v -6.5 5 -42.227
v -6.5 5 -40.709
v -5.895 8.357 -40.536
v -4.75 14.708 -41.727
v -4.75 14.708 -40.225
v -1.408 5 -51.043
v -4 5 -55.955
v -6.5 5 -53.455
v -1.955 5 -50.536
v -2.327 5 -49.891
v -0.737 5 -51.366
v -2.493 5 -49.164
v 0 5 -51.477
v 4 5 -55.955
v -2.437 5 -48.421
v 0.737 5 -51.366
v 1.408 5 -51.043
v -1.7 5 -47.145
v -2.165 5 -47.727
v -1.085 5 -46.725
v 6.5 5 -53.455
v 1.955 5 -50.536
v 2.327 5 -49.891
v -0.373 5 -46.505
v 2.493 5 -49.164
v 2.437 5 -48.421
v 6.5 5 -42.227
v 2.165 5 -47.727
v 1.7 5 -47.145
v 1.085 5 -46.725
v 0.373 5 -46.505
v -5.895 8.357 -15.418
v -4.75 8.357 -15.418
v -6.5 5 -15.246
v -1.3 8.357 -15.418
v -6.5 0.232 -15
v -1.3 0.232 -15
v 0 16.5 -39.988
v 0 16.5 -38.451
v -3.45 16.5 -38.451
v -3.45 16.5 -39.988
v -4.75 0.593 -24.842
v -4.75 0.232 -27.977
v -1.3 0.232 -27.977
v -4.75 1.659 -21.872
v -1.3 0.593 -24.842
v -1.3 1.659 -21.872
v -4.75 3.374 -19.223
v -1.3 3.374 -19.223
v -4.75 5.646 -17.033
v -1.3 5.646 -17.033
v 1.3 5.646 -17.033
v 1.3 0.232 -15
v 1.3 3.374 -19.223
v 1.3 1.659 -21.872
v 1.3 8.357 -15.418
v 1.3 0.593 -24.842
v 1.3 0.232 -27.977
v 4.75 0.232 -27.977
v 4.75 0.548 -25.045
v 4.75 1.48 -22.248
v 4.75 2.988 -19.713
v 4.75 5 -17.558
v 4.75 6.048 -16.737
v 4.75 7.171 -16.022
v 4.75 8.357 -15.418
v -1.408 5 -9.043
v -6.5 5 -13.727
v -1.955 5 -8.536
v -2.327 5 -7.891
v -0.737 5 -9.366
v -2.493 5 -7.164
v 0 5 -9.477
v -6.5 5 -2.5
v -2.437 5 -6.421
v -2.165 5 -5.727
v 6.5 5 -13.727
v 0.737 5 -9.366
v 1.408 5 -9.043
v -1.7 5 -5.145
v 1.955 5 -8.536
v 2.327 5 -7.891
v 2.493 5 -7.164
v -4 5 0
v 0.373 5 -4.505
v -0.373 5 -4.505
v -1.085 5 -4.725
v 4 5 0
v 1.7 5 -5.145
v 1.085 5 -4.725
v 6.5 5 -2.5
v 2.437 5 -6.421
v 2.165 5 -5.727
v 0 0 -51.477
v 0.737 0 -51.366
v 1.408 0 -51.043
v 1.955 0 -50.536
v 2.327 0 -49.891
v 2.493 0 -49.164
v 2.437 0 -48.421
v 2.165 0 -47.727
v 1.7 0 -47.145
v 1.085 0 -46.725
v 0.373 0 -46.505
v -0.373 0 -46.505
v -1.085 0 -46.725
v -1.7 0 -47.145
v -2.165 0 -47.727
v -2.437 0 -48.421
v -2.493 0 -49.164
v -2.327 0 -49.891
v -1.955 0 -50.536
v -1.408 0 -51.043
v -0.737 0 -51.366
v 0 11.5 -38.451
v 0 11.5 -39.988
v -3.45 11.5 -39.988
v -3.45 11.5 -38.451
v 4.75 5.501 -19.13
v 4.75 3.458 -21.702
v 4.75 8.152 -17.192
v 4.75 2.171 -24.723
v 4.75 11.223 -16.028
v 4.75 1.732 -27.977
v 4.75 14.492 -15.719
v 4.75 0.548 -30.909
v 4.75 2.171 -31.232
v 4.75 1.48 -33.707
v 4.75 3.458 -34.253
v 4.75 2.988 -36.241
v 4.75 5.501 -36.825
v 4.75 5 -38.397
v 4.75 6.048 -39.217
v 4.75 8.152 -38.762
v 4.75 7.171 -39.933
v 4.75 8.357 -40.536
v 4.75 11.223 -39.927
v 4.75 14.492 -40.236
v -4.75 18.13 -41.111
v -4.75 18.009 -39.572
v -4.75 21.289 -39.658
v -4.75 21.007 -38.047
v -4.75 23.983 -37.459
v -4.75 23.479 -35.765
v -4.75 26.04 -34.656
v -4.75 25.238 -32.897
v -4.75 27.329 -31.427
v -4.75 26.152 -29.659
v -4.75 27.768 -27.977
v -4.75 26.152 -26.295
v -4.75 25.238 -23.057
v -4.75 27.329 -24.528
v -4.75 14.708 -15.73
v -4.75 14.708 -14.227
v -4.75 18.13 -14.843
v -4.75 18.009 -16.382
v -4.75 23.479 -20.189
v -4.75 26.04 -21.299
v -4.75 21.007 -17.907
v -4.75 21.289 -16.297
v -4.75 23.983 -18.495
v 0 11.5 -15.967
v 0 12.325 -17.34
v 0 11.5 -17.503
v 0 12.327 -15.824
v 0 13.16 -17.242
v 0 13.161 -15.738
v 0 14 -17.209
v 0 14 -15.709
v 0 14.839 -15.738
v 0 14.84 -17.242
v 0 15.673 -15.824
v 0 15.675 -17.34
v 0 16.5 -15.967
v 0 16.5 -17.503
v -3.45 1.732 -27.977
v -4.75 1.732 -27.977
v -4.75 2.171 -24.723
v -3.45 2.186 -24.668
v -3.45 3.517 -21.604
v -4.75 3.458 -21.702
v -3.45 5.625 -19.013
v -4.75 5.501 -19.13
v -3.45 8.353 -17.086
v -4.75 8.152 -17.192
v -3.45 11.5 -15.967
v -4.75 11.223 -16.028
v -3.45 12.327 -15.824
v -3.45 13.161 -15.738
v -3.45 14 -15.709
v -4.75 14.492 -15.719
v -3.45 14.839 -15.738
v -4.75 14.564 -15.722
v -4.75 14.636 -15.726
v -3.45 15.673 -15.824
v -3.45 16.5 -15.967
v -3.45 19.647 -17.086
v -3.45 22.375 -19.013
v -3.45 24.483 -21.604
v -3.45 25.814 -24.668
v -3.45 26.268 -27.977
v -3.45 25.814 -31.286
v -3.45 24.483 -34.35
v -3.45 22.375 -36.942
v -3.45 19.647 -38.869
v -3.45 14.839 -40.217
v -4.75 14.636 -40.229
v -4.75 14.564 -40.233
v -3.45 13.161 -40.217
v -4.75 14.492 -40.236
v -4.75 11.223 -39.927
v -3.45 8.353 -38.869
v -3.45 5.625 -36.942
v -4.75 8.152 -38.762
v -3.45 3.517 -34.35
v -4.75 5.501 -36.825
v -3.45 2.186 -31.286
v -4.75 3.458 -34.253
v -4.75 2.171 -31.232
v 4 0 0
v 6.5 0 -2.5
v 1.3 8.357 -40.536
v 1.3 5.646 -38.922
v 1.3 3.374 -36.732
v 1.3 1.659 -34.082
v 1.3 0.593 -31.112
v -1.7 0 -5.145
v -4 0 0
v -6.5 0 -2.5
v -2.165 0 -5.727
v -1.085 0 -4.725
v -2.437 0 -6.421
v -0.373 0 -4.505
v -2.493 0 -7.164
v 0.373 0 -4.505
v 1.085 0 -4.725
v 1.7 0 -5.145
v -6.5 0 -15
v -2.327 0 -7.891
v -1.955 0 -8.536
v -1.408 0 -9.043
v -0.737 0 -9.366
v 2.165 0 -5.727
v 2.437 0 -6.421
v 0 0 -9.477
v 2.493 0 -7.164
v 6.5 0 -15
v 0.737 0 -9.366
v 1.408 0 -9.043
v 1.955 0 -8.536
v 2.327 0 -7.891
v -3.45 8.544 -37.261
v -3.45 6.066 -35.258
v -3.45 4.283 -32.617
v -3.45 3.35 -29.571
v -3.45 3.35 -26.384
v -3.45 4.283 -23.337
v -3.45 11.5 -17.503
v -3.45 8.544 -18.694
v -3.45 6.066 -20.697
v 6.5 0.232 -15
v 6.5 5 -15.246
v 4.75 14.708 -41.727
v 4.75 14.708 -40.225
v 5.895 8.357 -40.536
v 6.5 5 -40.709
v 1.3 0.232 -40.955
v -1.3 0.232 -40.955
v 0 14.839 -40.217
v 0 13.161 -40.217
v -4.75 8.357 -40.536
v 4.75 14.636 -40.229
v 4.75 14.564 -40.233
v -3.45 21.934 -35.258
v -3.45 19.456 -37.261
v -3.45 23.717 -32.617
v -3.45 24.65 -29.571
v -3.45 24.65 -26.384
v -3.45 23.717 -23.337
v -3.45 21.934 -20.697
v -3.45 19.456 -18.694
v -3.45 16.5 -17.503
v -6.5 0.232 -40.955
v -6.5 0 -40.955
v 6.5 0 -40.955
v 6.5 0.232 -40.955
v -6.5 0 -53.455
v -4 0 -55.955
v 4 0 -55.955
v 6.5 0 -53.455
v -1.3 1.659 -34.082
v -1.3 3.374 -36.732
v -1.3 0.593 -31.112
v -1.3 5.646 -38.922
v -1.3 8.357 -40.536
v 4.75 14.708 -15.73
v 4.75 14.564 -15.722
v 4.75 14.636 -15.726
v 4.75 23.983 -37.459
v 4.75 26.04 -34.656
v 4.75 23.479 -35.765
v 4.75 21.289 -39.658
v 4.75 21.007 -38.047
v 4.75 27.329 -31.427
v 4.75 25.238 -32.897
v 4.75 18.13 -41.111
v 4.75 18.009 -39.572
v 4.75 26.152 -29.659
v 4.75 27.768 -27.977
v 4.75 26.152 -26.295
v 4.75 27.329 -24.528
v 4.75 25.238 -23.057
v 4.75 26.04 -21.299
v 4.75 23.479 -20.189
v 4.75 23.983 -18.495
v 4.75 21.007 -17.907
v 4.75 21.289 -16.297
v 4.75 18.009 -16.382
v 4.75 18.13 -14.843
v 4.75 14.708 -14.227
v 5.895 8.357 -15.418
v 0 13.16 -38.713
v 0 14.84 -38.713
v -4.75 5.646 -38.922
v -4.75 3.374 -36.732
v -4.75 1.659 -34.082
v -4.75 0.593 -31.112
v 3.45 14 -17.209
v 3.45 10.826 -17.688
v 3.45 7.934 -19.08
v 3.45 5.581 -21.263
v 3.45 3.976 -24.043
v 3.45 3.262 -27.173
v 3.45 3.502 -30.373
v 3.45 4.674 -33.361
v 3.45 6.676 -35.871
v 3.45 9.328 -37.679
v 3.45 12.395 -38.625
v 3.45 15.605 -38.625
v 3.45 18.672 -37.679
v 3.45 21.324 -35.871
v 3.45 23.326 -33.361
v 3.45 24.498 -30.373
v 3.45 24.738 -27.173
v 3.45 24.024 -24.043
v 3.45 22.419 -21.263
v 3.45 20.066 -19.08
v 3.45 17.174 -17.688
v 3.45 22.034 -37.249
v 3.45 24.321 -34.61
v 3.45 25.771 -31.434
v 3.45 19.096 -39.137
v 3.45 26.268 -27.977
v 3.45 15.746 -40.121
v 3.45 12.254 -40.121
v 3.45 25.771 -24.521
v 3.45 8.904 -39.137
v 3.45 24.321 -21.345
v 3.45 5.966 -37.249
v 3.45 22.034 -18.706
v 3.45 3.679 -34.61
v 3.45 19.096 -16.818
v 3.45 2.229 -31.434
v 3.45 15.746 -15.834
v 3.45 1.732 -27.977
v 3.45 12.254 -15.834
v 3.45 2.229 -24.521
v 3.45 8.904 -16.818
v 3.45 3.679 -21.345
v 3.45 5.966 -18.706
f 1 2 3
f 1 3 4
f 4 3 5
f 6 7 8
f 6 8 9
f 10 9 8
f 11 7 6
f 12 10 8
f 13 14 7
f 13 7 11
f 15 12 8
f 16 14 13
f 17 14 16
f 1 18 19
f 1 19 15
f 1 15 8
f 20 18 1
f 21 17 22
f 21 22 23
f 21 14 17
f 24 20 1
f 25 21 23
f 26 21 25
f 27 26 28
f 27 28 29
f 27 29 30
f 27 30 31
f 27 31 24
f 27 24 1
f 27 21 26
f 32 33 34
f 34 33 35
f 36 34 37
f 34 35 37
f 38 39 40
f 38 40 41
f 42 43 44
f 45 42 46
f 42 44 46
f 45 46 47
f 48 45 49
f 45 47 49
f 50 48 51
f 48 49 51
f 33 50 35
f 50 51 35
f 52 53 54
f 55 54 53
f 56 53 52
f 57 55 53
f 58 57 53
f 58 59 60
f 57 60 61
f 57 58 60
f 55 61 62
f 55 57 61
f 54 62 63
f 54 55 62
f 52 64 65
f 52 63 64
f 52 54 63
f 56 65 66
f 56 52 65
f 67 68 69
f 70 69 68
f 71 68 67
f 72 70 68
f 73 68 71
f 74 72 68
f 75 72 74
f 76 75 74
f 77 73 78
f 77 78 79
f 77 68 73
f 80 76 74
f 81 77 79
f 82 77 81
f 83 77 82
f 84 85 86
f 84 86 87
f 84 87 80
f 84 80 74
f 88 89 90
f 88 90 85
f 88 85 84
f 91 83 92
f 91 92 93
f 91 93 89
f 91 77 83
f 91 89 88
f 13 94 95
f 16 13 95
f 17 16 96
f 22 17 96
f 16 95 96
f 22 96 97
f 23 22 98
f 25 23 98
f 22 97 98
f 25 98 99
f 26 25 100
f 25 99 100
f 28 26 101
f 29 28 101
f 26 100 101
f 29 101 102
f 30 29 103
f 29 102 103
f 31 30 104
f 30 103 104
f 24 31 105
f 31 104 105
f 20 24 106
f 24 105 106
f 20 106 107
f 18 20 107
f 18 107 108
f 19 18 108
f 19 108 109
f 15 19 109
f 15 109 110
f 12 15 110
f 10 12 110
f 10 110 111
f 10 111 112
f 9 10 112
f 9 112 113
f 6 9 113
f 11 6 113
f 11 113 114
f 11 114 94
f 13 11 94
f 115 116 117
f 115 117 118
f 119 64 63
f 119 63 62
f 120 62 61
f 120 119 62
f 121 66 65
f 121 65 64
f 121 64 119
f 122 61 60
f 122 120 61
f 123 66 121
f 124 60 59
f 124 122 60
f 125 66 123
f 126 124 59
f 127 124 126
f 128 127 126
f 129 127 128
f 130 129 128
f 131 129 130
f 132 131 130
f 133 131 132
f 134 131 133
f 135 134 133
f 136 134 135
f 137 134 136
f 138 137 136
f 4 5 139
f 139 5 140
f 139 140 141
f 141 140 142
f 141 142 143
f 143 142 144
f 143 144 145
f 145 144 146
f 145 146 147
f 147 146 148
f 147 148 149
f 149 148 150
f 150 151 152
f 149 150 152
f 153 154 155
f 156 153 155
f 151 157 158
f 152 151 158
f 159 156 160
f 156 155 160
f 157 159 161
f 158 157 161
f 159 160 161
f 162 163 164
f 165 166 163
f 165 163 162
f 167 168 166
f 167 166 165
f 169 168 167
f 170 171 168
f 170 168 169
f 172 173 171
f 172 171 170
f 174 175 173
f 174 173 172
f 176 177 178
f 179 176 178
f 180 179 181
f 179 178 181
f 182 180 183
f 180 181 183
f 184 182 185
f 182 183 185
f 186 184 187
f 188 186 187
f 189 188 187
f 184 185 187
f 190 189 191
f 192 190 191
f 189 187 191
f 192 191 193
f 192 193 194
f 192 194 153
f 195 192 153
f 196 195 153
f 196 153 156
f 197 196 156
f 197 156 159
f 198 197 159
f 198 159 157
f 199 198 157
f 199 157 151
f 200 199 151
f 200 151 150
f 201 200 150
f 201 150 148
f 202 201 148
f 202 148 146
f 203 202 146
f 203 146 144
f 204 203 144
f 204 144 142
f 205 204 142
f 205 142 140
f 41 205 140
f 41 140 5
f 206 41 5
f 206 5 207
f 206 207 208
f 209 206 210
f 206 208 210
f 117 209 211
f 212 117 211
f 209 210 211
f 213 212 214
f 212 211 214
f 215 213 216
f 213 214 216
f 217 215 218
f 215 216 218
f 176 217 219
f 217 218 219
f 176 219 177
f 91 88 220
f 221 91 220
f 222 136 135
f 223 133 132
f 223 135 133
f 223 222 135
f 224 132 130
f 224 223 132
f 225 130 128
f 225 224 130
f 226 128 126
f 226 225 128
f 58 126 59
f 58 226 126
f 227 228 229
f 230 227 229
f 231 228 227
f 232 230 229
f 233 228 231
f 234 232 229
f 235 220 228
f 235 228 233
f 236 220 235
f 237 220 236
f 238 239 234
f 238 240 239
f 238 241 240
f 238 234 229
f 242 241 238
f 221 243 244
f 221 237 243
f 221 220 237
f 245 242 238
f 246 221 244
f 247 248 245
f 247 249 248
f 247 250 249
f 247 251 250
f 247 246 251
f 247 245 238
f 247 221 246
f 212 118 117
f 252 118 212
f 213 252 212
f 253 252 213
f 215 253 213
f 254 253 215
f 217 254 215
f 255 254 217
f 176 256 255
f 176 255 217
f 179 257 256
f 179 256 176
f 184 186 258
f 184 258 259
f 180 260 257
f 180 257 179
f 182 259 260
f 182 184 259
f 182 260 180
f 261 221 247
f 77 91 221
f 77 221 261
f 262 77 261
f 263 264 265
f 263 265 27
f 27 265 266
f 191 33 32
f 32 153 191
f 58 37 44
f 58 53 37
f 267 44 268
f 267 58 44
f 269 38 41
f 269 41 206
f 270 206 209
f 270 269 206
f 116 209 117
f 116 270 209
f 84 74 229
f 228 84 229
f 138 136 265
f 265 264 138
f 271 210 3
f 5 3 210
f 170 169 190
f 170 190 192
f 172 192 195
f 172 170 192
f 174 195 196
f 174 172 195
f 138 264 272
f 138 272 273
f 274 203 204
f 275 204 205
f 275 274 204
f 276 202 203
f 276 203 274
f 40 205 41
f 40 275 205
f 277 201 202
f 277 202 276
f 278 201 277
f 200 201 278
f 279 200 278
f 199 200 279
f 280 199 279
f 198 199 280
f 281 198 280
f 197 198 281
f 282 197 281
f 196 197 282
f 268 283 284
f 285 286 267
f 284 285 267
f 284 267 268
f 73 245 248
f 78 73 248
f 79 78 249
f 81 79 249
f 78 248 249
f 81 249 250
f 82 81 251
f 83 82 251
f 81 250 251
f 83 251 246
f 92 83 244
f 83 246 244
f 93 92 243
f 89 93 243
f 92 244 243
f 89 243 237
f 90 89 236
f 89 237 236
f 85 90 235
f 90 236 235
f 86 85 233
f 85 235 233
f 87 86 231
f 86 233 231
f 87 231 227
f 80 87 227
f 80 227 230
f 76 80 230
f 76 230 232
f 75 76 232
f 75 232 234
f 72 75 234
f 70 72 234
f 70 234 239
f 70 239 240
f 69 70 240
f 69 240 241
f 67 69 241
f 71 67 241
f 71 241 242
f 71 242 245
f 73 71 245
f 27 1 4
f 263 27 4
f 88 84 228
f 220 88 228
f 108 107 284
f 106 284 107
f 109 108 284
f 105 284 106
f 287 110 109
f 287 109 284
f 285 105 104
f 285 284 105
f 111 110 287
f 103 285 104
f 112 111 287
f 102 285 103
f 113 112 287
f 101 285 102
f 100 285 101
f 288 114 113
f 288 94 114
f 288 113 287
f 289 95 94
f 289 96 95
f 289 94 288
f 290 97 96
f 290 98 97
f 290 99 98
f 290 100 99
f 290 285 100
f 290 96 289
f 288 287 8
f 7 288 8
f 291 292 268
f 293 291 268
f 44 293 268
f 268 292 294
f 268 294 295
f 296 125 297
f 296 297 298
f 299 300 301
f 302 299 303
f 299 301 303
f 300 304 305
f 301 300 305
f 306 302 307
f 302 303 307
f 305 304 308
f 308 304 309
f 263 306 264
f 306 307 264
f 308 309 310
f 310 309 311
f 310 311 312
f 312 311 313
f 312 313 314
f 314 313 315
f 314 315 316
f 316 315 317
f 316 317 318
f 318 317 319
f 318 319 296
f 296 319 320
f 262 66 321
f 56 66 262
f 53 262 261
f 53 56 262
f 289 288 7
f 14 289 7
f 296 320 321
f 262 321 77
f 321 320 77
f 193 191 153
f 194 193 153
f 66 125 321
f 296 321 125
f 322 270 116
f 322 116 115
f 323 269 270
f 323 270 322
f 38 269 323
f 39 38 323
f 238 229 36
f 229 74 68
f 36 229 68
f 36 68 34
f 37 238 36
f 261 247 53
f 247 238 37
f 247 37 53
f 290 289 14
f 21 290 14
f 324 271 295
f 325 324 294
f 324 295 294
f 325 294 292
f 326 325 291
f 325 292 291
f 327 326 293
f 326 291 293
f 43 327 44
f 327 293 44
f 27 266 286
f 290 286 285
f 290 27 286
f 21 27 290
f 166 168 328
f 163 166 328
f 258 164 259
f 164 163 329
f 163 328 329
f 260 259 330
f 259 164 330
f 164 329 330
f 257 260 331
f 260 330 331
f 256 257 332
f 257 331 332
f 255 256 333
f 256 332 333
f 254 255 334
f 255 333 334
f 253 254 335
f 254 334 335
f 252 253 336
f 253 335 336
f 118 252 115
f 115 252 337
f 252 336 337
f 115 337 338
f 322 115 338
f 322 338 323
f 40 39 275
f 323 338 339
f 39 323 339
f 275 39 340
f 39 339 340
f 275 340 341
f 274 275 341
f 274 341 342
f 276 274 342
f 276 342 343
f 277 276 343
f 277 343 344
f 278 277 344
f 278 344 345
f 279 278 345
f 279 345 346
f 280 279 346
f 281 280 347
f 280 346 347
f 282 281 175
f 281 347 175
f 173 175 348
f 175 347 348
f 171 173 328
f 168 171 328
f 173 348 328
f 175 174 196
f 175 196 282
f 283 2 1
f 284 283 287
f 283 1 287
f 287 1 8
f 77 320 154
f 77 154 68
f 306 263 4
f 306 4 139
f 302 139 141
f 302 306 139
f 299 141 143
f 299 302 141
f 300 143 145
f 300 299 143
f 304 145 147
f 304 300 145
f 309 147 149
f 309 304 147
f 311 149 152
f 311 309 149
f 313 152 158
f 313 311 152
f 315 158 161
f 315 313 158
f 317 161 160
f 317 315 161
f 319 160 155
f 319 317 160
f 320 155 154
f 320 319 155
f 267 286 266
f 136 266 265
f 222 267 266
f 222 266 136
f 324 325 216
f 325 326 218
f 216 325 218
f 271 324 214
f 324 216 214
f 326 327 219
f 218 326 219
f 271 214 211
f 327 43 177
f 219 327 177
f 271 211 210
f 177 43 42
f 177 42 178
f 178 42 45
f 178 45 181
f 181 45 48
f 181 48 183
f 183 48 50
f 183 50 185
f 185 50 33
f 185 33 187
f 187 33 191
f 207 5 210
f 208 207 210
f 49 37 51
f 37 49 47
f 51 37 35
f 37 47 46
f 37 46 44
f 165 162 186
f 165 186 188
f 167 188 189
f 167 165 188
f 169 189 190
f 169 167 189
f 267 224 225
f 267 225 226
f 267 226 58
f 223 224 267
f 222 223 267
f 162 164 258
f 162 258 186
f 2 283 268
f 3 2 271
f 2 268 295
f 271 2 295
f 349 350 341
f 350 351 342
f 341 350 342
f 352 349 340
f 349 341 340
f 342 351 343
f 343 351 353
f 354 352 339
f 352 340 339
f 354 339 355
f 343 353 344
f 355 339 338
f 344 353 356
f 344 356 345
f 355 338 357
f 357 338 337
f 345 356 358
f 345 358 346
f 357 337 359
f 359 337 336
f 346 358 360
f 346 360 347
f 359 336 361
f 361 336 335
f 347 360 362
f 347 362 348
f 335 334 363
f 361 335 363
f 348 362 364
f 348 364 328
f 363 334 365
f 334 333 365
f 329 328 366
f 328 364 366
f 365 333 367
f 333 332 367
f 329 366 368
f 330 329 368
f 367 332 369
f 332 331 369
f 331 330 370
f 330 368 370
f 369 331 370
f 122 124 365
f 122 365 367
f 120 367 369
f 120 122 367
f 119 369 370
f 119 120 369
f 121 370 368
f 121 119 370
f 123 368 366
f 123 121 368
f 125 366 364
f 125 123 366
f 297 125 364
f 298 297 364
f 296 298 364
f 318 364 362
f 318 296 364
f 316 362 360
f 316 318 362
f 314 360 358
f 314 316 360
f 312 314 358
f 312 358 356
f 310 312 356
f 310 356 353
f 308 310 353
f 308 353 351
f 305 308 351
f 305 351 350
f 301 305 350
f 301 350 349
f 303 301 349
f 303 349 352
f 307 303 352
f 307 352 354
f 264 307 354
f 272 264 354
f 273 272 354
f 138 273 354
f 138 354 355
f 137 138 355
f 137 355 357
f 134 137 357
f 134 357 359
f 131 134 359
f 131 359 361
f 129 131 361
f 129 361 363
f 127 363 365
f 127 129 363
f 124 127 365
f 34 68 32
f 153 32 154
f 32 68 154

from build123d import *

# Parameters (mm, degrees)
SKETCH1_R              = 13.768224287
SKETCH1_R_2            = 12.268224287
SKETCH1_R_3            = 10.768224287
BOSS_EXTRUDE1_DEPTH    = 6.5
CUT_EXTRUDE3_DEPTH     = 519.353793234
CUT_EXTRUDE1_START     = -1.3
CUT_EXTRUDE1_DEPTH     = 13
CUT_EXTRUDE8_START     = -1.75
CUT_EXTRUDE8_OUTLINE_R = 10.768224287
CUT_EXTRUDE8_DEPTH     = 1.75
SKETCH6_R              = 12.268224287
CUT_EXTRUDE9_DEPTH     = 1.3
CUT_EXTRUDE12_START    = -1.75
CUT_EXTRUDE12_DEPTH    = 1.75
SKETCH8_R              = 2.5
CUT_EXTRUDE13_DEPTH    = 63.803249571
CHAMFER1_SIZE          = 2.5
CUT_EXTRUDE14_START    = -3.45
CUT_EXTRUDE14_DEPTH    = 3.45


# Read off the part's stored shape, not the designer's step: Cut-Extrude8
with BuildPart() as part:
    # Sketch1 → Boss-Extrude1 (new, symmetric)
    # profile 1 of 6: a face of its own
    with BuildSketch(Plane(origin=(0, 0, 0), x_dir=(0, 0, -1), z_dir=(1, 0, 0))):
        with BuildLine():
            Line((0, 5), (0, 0))
            Line((0, 0), (15, 0))
            Line((15, 0), (15, 0.231775713))
            Line((15, 0.231775713), (15.418491318, 8.357342638))
            ThreePointArc((15.418491318, 8.357342638), (14.445072398, 11.461887277), (14.227329557, 14.708166664))
            Line((14.227329557, 14.708166664), (13.727329557, 5))
            Line((13.727329557, 5), (0, 5))
        make_face()
    # profile 2 of 6: a face of its own
    with BuildSketch(Plane(origin=(0, 0, 0), x_dir=(0, 0, -1), z_dir=(1, 0, 0))):
        with BuildLine():
            Line((15.418491318, 8.357342638), (15, 0.231775713))
            Line((15, 0.231775713), (27.977329557, 0.231775713))
            ThreePointArc((27.977329557, 0.231775713), (20.498204345, 2.440299049), (15.418491318, 8.357342638))
        make_face()
    # profile 3 of 6: a face of its own
    with BuildSketch(Plane(origin=(0, 0, 0), x_dir=(0, 0, -1), z_dir=(1, 0, 0))):
        with BuildLine():
            ThreePointArc((40.536167797, 8.357342638), (35.45645477, 2.440299049), (27.977329557, 0.231775713))
            Line((27.977329557, 0.231775713), (40.954659115, 0.231775713))
            Line((40.954659115, 0.231775713), (40.536167797, 8.357342638))
        make_face()
    # profile 4 of 6: a face of its own
    with BuildSketch(Plane(origin=(0, 0, 0), x_dir=(0, 0, -1), z_dir=(1, 0, 0))):
        with BuildLine():
            Line((42.227329557, 5), (41.727329557, 14.708166664))
            ThreePointArc((41.727329557, 14.708166664), (41.740997019, 14.354200561), (41.745553845, 14))
            ThreePointArc((41.745553845, 14), (41.439812643, 11.114597224), (40.536167797, 8.357342638))
            Line((40.536167797, 8.357342638), (40.954659115, 0.231775713))
            Line((40.954659115, 0.231775713), (40.954659115, 0))
            Line((40.954659115, 0), (55.954659115, 0))
            Line((55.954659115, 0), (55.954659115, 5))
            Line((55.954659115, 5), (42.227329557, 5))
        make_face()
    # profile 5 of 6: a face of its own
    with BuildSketch(Plane(origin=(0, 0, 0), x_dir=(0, 0, -1), z_dir=(1, 0, 0))):
        with Locations((27.977329557, 14)):
            Circle(SKETCH1_R)
        with Locations((27.977329557, 14)):
            Circle(SKETCH1_R_2, mode=Mode.SUBTRACT)
    # profile 6 of 6: a face of its own
    with BuildSketch(Plane(origin=(0, 0, 0), x_dir=(0, 0, -1), z_dir=(1, 0, 0))):
        with Locations((27.977329557, 14)):
            Circle(SKETCH1_R_2)
        with Locations(Location((27.977329557, 14, 0), (0, 0, 180))):
            Circle(SKETCH1_R_3, mode=Mode.SUBTRACT)
    extrude(amount=BOSS_EXTRUDE1_DEPTH, both=True)

    # Sketch3 → Cut-Extrude3 (cut, through all)
    with BuildSketch(Plane(origin=(0, -487.515659686, 0), x_dir=(-1, 0, 0), z_dir=(0, 0, 1))):
        Polygon((-4.75, -502.22382635), (-6.5, -492.515659686), (-6.5, -515.283883974), (-4.75, -515.283883974), align=None)
        Polygon((6.5, -515.283883974), (6.5, -492.515659686), (4.75, -502.22382635), (4.75, -515.283883974), align=None)
    extrude(amount=-CUT_EXTRUDE3_DEPTH, mode=Mode.SUBTRACT)

    # Sketch2 → Cut-Extrude1 (cut)
    with BuildSketch(Plane(origin=(0, 0, 0), x_dir=(0, 0, -1), z_dir=(1, 0, 0)).offset(CUT_EXTRUDE1_START)):
        with BuildLine():
            Line((15, 0.231775713), (27.977329557, 0.231775713))
            ThreePointArc((27.977329557, 0.231775713), (20.498204345, 2.440299049), (15.418491318, 8.357342638))
            Line((15.418491318, 8.357342638), (15, 0.231775713))
        make_face()
        with BuildLine():
            Line((27.977329557, 0.231775713), (40.954659115, 0.231775713))
            Line((40.954659115, 0.231775713), (40.536167797, 8.357342638))
            ThreePointArc((40.536167797, 8.357342638), (35.45645477, 2.440299049), (27.977329557, 0.231775713))
        make_face()
    cut_extrude1 = extrude(amount=-CUT_EXTRUDE1_DEPTH, mode=Mode.SUBTRACT)

    # Cut-Extrude8 outline → Cut-Extrude8 (cut)
    with BuildSketch(Plane.ZY.offset(6.5).offset(CUT_EXTRUDE8_START)):
        with BuildLine():
            Line((-40.225097809, 14.708166664), (-40.536167797, 8.357342638))
            ThreePointArc((-40.536167797, 8.357342638), (-27.977329557, 0.231775713), (-15.418491318, 8.357342638))
            Line((-15.418491318, 8.357342638), (-15.729561306, 14.708166664))
            ThreePointArc((-15.729561306, 14.708166664), (-27.977329557, 26.268224287), (-40.225097809, 14.708166664))
        make_face()
        with Locations((-27.977329557, 14)):
            Circle(CUT_EXTRUDE8_OUTLINE_R, mode=Mode.SUBTRACT)
    extrude(amount=CUT_EXTRUDE8_DEPTH, mode=Mode.SUBTRACT)

    # Sketch6 → Cut-Extrude9 (cut)
    with BuildSketch(Plane.ZY.offset(4.75)):
        with Locations(Location((-27.977329557, 14, 0), (0, 0, 270))):
            Circle(SKETCH6_R)
    cut_extrude9 = extrude(amount=-CUT_EXTRUDE9_DEPTH, mode=Mode.SUBTRACT)

    # Mirror2: Cut-Extrude1, Cut-Extrude9 across plane
    add(cut_extrude1.mirror(Plane(origin=(0, 0, 0), x_dir=(0, 0, 1), z_dir=(1, 0, 0))), mode=Mode.SUBTRACT)
    add(cut_extrude9.mirror(Plane(origin=(0, 0, 0), x_dir=(0, 0, 1), z_dir=(1, 0, 0))), mode=Mode.SUBTRACT)

    # Sketch7 → Cut-Extrude12 (cut)
    with BuildSketch(Plane(origin=(6.5, 0, 0), x_dir=(0, 0, -1), z_dir=(1, 0, 0)).offset(CUT_EXTRUDE12_START)):
        with BuildLine():
            ThreePointArc((38.396734532, 5), (39.588438578, 6.600936051), (40.536167797, 8.357342638))
            Line((40.536167797, 8.357342638), (40.225097809, 14.708166664))
            ThreePointArc((40.225097809, 14.708166664), (27.977329557, 26.268224287), (15.729561306, 14.708166664))
            Line((15.729561306, 14.708166664), (15.418491318, 8.357342638))
            ThreePointArc((15.418491318, 8.357342638), (16.366220536, 6.600936051), (17.557924583, 5))
            Line((17.557924583, 5), (22.065083427, 5))
            ThreePointArc((22.065083427, 5), (27.977329557, 3.231775713), (33.889575687, 5))
            Line((33.889575687, 5), (38.396734532, 5))
        make_face()
        with BuildLine():
            Line((22.065083427, 5), (17.557924583, 5))
            ThreePointArc((17.557924583, 5), (27.977329557, 0.231775713), (38.396734532, 5))
            Line((38.396734532, 5), (33.889575687, 5))
            ThreePointArc((33.889575687, 5), (27.977329557, 3.231775713), (22.065083427, 5))
        make_face()
    extrude(amount=CUT_EXTRUDE12_DEPTH, mode=Mode.SUBTRACT)

    # Sketch8 → Cut-Extrude13 (cut, through all)
    with BuildSketch(Plane.XZ):
        with Locations(Location((0, -48.977329557, 0), (0, 0, 270))):
            Circle(SKETCH8_R)
        with Locations(Location((0, -6.977329557, 0), (0, 0, 270))):
            Circle(SKETCH8_R)
    extrude(amount=-CUT_EXTRUDE13_DEPTH, mode=Mode.SUBTRACT)

    # Chamfer1
    chamfer1_edges = [part.edges().sort_by_distance(p)[0] for p in [
        (-6.5, 2.5, 0),
        (6.5, 2.5, -55.954659115),
        (-6.5, 2.5, -55.954659115),
        (6.5, 2.5, 0),
    ]]
    chamfer(chamfer1_edges, length=CHAMFER1_SIZE)

    # Sketch9 → Cut-Extrude14 (cut)
    with BuildSketch(Plane.ZY.offset(3.45).offset(CUT_EXTRUDE14_START)):
        with BuildLine():
            Line((-38.451328521, 16.5), (-39.988129995, 16.5))
            ThreePointArc((-39.988129995, 16.5), (-40.245553845, 14), (-39.988129995, 11.5))
            Line((-39.988129995, 11.5), (-38.451328521, 11.5))
            ThreePointArc((-38.451328521, 11.5), (-38.745553845, 14), (-38.451328521, 16.5))
        make_face()
        with BuildLine():
            ThreePointArc((-15.70910527, 14), (-15.773630921, 15.256609231), (-15.966529119, 16.5))
            Line((-15.966529119, 16.5), (-17.503330593, 16.5))
            ThreePointArc((-17.503330593, 16.5), (-17.282914559, 15.258627083), (-17.20910527, 14))
            ThreePointArc((-17.20910527, 14), (-17.282914559, 12.741372917), (-17.503330593, 11.5))
            Line((-17.503330593, 11.5), (-15.966529119, 11.5))
            ThreePointArc((-15.966529119, 11.5), (-15.773630921, 12.743390769), (-15.70910527, 14))
        make_face()
    extrude(amount=CUT_EXTRUDE14_DEPTH, mode=Mode.SUBTRACT)


solid = part.part
